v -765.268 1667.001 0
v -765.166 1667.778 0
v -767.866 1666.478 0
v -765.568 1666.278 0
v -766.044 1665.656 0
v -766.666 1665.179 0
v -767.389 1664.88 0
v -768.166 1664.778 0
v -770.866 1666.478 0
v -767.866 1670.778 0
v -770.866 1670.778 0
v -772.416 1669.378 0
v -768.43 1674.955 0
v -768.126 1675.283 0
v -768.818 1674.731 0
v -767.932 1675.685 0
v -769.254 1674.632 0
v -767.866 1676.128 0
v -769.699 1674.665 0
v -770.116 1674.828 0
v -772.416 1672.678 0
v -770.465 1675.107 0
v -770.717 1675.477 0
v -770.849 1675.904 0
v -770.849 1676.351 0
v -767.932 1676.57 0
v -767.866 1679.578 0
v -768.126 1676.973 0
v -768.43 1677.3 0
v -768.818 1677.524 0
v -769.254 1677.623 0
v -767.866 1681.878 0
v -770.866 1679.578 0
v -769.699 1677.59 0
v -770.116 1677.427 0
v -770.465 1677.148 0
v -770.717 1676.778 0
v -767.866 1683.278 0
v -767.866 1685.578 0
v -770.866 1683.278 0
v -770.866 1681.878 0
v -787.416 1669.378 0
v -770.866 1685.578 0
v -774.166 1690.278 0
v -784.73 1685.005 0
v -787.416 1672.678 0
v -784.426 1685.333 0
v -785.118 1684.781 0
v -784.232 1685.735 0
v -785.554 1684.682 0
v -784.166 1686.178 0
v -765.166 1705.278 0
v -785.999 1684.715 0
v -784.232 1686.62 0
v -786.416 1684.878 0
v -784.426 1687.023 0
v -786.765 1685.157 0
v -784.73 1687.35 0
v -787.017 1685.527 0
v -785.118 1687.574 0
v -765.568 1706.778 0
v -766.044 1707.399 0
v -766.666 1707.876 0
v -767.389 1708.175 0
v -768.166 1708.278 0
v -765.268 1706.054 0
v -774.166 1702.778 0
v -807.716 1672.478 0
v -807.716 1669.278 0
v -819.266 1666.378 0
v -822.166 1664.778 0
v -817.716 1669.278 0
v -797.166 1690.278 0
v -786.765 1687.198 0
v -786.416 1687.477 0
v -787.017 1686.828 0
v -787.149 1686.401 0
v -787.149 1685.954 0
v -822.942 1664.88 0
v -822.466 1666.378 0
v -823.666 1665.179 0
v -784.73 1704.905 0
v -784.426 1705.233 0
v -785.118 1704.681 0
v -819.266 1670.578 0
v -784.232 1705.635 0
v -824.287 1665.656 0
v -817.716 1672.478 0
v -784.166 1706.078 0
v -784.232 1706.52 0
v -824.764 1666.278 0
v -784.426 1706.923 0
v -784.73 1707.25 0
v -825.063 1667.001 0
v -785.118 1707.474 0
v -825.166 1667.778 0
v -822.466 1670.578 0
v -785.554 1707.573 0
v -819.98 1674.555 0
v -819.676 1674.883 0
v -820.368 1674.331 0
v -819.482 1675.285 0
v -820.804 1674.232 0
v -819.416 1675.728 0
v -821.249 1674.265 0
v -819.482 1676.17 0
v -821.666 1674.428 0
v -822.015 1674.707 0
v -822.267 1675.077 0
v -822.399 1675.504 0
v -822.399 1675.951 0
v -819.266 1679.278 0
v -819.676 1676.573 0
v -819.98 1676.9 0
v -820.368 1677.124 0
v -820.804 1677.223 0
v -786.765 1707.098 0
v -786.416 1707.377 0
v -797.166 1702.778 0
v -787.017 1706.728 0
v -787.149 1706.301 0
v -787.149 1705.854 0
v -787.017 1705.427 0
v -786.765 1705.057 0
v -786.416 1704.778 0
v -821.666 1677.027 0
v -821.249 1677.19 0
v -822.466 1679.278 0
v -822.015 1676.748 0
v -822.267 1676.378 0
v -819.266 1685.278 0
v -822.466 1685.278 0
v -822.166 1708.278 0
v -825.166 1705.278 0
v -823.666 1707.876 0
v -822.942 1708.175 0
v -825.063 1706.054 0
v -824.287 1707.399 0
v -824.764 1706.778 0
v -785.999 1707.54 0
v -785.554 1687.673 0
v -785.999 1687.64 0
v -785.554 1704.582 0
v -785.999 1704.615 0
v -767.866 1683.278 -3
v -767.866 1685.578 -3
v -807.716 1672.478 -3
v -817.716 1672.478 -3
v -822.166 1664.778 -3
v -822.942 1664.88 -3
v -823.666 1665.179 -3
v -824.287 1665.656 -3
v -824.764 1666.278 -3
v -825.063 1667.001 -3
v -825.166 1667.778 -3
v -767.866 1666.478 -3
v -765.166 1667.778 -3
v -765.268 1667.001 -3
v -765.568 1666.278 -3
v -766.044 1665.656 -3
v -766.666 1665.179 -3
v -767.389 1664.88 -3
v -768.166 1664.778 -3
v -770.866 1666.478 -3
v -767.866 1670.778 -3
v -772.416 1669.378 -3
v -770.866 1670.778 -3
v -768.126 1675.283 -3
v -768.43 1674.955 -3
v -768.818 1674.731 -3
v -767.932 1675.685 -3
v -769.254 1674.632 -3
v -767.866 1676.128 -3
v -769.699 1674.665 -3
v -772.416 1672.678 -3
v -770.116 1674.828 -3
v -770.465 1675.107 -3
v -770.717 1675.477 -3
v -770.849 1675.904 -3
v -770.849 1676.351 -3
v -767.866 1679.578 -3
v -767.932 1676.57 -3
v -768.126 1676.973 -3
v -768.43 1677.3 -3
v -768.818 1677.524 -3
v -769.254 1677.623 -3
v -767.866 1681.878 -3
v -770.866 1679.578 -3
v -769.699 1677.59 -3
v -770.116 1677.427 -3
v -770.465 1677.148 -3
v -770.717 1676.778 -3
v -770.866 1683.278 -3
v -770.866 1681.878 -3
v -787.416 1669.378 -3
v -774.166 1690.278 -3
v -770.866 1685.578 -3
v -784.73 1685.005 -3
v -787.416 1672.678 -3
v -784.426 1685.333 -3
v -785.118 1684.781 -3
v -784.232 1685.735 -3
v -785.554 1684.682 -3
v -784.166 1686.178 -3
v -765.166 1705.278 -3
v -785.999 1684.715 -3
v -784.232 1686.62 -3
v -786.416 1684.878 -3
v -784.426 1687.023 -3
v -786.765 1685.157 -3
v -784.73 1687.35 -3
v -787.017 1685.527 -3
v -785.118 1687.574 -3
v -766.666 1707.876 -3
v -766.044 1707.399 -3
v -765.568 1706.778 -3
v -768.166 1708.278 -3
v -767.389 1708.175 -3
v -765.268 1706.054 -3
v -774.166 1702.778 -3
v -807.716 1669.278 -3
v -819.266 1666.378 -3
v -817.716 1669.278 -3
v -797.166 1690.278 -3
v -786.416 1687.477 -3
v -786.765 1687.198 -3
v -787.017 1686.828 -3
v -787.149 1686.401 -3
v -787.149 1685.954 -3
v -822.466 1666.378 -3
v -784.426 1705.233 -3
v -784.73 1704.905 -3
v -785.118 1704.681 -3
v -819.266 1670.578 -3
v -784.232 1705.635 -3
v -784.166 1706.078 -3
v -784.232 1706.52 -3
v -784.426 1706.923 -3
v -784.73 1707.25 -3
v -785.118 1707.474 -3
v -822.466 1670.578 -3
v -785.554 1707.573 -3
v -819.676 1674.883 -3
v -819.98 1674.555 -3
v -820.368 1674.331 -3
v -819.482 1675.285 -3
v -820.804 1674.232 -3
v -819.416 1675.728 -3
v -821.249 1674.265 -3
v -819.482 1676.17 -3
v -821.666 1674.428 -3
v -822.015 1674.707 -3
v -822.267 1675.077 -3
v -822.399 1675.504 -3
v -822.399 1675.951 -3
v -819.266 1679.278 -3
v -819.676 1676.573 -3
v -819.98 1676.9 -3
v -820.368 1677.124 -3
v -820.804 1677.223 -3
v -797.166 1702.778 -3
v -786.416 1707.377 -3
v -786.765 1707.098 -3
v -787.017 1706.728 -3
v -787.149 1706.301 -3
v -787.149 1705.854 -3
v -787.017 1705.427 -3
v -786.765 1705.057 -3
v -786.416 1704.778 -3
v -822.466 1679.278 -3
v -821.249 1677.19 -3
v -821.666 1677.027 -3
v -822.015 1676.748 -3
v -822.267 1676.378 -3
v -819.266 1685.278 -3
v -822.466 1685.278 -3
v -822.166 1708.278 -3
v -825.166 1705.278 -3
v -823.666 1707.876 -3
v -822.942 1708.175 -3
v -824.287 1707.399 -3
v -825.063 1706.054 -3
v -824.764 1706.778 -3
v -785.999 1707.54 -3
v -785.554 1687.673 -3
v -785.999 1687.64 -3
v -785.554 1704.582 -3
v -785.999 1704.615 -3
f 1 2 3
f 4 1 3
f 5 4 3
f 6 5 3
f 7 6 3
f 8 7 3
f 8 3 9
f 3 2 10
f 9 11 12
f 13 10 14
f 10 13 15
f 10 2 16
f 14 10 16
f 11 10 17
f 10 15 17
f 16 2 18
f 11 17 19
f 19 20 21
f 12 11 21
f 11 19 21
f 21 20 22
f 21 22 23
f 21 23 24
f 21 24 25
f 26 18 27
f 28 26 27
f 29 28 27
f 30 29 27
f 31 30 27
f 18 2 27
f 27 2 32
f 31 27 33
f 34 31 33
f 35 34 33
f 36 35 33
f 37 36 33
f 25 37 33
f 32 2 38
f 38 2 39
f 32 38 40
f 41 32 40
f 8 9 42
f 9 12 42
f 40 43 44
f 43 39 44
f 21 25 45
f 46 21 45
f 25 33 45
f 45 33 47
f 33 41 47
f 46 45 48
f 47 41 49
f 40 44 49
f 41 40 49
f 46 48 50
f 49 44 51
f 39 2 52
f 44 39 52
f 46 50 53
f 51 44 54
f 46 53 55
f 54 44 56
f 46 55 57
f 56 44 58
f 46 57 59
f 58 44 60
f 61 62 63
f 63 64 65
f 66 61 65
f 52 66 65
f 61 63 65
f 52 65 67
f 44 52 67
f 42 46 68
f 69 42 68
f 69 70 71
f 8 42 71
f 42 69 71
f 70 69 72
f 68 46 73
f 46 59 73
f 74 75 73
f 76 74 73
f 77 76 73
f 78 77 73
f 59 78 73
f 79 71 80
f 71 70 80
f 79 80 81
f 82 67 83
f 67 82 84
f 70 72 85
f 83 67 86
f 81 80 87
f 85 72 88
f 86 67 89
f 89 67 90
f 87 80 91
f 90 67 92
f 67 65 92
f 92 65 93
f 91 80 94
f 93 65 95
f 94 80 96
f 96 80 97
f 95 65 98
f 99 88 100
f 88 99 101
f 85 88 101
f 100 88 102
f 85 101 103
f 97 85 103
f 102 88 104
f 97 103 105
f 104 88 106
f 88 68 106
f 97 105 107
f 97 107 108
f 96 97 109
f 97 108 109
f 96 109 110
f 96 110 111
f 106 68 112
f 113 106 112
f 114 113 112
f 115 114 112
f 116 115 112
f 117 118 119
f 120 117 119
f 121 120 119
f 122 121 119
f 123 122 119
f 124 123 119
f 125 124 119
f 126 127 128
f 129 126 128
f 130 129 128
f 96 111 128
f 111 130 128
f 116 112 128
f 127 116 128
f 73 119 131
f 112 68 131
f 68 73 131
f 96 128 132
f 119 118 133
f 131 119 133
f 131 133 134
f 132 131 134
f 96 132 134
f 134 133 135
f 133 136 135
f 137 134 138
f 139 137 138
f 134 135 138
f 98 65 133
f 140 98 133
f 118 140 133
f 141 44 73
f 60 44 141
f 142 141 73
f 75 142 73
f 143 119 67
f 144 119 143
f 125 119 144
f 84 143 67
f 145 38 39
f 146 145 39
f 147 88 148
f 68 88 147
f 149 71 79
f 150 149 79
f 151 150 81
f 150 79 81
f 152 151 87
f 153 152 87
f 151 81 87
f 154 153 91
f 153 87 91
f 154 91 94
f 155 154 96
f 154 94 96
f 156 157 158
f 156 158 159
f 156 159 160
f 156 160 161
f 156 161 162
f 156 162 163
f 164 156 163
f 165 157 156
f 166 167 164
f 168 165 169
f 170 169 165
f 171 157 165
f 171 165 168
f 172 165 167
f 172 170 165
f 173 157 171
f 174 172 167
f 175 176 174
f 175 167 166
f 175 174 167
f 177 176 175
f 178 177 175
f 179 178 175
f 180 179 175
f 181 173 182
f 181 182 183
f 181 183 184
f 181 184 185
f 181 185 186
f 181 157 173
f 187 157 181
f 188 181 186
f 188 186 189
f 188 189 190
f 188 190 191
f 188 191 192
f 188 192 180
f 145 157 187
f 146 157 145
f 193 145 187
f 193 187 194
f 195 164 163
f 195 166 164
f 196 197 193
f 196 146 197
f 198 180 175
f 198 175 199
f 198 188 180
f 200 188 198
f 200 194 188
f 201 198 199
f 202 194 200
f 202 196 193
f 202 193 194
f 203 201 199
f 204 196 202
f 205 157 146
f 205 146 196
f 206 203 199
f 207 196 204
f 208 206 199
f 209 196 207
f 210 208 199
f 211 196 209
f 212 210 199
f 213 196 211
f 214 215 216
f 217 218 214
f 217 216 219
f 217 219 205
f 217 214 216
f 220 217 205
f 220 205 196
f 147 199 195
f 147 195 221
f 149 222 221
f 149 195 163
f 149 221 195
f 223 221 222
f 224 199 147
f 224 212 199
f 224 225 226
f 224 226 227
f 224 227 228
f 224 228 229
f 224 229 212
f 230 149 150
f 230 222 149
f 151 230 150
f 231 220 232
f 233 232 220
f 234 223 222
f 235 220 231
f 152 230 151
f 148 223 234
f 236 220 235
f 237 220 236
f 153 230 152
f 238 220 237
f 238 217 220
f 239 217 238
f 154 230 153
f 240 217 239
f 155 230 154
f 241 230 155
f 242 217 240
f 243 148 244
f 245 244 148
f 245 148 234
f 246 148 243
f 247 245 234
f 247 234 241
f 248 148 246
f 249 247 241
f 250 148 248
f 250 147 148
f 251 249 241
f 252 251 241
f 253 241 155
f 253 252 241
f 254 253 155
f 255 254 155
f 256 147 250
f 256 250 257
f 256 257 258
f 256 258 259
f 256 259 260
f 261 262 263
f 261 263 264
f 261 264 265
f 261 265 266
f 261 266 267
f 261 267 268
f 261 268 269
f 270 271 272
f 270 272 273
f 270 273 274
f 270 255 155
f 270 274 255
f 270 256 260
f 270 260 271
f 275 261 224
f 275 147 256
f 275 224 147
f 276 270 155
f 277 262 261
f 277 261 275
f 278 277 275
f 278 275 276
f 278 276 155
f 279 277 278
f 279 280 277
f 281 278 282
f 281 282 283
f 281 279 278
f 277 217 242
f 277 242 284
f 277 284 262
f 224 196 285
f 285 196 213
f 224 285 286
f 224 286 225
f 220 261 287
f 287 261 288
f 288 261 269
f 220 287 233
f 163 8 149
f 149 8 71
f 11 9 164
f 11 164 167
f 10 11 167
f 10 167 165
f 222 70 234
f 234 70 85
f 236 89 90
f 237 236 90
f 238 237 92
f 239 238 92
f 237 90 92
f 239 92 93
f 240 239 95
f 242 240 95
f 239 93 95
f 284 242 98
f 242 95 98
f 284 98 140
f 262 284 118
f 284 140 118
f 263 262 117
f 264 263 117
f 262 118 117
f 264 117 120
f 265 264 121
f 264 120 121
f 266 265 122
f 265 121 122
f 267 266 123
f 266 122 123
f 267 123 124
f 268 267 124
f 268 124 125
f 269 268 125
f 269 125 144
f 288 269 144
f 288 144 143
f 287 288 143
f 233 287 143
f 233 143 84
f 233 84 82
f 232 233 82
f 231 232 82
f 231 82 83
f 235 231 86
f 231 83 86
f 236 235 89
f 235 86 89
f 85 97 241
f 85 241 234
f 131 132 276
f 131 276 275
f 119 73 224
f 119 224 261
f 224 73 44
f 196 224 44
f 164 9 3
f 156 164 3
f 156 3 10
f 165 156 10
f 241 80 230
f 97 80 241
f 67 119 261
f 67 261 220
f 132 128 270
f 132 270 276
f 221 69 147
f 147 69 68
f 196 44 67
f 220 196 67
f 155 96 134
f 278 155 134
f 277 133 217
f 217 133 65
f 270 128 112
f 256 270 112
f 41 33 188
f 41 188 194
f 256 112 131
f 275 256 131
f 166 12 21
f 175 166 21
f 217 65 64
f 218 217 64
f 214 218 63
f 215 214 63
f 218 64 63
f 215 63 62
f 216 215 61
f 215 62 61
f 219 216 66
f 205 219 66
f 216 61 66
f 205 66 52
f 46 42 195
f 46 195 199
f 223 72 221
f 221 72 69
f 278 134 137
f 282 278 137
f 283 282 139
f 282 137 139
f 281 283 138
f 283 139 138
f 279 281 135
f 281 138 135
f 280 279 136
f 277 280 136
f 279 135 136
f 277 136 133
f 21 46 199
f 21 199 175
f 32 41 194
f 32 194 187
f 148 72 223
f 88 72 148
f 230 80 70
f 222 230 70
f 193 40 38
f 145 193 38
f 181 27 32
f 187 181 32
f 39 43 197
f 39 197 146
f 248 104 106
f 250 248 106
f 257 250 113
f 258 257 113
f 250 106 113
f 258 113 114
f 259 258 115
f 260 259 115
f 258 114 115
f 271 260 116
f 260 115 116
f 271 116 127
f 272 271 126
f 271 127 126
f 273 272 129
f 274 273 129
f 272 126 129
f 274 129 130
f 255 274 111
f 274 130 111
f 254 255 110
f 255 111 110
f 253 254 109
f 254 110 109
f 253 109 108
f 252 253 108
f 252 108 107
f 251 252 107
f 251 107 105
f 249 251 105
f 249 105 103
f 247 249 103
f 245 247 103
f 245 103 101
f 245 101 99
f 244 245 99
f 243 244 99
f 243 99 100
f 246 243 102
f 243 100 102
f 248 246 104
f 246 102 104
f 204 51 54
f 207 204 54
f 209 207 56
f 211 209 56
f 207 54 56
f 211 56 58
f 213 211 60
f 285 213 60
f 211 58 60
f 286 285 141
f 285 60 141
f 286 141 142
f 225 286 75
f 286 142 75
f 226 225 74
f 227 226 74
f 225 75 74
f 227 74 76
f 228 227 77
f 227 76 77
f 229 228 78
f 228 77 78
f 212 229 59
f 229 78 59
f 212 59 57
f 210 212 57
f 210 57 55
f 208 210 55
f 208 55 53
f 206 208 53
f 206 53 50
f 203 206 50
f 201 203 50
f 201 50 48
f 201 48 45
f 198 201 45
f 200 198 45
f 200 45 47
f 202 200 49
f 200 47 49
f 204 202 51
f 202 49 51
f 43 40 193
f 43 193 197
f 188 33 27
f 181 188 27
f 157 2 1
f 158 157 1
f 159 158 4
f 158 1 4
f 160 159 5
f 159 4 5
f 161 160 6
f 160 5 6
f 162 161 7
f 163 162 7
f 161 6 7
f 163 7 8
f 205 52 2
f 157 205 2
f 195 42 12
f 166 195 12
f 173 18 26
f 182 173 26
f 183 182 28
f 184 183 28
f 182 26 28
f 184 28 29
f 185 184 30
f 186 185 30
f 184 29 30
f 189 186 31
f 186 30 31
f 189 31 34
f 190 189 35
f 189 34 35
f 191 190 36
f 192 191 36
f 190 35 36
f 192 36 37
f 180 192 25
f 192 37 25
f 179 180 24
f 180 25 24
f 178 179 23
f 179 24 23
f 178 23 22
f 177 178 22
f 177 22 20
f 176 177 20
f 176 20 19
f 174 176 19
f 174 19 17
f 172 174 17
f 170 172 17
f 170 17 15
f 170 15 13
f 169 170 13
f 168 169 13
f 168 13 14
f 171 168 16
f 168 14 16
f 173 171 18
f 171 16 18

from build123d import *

# Parameters (mm, degrees)
ESQUISSE1_R               = 1.5
ESQUISSE1_W               = 23
ESQUISSE1_H               = 12.5
ESQUISSE1_W_2             = 3.2
ESQUISSE1_H_2             = 6
ESQUISSE1_H_3             = 4.2
ESQUISSE1_W_3             = 10
ESQUISSE1_H_4             = 3.2
ESQUISSE1_W_4             = 15
ESQUISSE1_H_5             = 3.3
ESQUISSE1_W_5             = 3
ESQUISSE1_H_6             = 4.3
ESQUISSE1_H_7             = 2.3
T_LE_DE_BASE_PLI_E1_DEPTH = 3


# Sheet-metal steps are written as plain solids
with BuildPart() as part:
    # Esquisse1 → Tôle de base pliée1 (new body)
    with BuildSketch(Plane.XY):
        with BuildLine():
            Line((-822.16567012, 1708.277520055), (-768.16567012, 1708.277520055))
            ThreePointArc((-768.16567012, 1708.277520055), (-766.044349777, 1707.398840398), (-765.16567012, 1705.277520055))
            Line((-765.16567012, 1705.277520055), (-765.16567012, 1667.777520055))
            ThreePointArc((-765.16567012, 1667.777520055), (-766.044349777, 1665.656199711), (-768.16567012, 1664.777520055))
            Line((-768.16567012, 1664.777520055), (-822.16567012, 1664.777520055))
            ThreePointArc((-822.16567012, 1664.777520055), (-824.286990464, 1665.656199711), (-825.16567012, 1667.777520055))
            Line((-825.16567012, 1667.777520055), (-825.16567012, 1705.277520055))
            ThreePointArc((-825.16567012, 1705.277520055), (-824.286990464, 1707.398840398), (-822.16567012, 1708.277520055))
        make_face()
        with Locations((-785.66567012, 1706.077520055)):
            Circle(ESQUISSE1_R, mode=Mode.SUBTRACT)
        with Locations((-785.66567012, 1686.177520055)):
            Circle(ESQUISSE1_R, mode=Mode.SUBTRACT)
        with Locations((-820.91567012, 1675.727520055)):
            Circle(ESQUISSE1_R, mode=Mode.SUBTRACT)
        with Locations((-769.36567012, 1676.127520055)):
            Circle(ESQUISSE1_R, mode=Mode.SUBTRACT)
        with Locations((-785.66567012, 1696.527520055)):
            Rectangle(ESQUISSE1_W, ESQUISSE1_H, mode=Mode.SUBTRACT)
        with Locations((-820.86567012, 1682.277520055)):
            Rectangle(ESQUISSE1_W_2, ESQUISSE1_H_2, mode=Mode.SUBTRACT)
        with Locations((-820.86567012, 1668.477520055)):
            Rectangle(ESQUISSE1_W_2, ESQUISSE1_H_3, mode=Mode.SUBTRACT)
        with Locations((-812.71567012, 1670.877520055)):
            Rectangle(ESQUISSE1_W_3, ESQUISSE1_H_4, mode=Mode.SUBTRACT)
        with Locations((-779.91567012, 1671.027520055)):
            Rectangle(ESQUISSE1_W_4, ESQUISSE1_H_5, mode=Mode.SUBTRACT)
        with Locations((-769.36567012, 1668.627520055)):
            Rectangle(ESQUISSE1_W_5, ESQUISSE1_H_6, mode=Mode.SUBTRACT)
        with Locations((-769.36567012, 1680.727520055)):
            Rectangle(ESQUISSE1_W_5, ESQUISSE1_H_7, mode=Mode.SUBTRACT)
        with Locations((-769.36567012, 1684.427520055)):
            Rectangle(ESQUISSE1_W_5, ESQUISSE1_H_7, mode=Mode.SUBTRACT)
    extrude(amount=-T_LE_DE_BASE_PLI_E1_DEPTH)


solid = part.part
